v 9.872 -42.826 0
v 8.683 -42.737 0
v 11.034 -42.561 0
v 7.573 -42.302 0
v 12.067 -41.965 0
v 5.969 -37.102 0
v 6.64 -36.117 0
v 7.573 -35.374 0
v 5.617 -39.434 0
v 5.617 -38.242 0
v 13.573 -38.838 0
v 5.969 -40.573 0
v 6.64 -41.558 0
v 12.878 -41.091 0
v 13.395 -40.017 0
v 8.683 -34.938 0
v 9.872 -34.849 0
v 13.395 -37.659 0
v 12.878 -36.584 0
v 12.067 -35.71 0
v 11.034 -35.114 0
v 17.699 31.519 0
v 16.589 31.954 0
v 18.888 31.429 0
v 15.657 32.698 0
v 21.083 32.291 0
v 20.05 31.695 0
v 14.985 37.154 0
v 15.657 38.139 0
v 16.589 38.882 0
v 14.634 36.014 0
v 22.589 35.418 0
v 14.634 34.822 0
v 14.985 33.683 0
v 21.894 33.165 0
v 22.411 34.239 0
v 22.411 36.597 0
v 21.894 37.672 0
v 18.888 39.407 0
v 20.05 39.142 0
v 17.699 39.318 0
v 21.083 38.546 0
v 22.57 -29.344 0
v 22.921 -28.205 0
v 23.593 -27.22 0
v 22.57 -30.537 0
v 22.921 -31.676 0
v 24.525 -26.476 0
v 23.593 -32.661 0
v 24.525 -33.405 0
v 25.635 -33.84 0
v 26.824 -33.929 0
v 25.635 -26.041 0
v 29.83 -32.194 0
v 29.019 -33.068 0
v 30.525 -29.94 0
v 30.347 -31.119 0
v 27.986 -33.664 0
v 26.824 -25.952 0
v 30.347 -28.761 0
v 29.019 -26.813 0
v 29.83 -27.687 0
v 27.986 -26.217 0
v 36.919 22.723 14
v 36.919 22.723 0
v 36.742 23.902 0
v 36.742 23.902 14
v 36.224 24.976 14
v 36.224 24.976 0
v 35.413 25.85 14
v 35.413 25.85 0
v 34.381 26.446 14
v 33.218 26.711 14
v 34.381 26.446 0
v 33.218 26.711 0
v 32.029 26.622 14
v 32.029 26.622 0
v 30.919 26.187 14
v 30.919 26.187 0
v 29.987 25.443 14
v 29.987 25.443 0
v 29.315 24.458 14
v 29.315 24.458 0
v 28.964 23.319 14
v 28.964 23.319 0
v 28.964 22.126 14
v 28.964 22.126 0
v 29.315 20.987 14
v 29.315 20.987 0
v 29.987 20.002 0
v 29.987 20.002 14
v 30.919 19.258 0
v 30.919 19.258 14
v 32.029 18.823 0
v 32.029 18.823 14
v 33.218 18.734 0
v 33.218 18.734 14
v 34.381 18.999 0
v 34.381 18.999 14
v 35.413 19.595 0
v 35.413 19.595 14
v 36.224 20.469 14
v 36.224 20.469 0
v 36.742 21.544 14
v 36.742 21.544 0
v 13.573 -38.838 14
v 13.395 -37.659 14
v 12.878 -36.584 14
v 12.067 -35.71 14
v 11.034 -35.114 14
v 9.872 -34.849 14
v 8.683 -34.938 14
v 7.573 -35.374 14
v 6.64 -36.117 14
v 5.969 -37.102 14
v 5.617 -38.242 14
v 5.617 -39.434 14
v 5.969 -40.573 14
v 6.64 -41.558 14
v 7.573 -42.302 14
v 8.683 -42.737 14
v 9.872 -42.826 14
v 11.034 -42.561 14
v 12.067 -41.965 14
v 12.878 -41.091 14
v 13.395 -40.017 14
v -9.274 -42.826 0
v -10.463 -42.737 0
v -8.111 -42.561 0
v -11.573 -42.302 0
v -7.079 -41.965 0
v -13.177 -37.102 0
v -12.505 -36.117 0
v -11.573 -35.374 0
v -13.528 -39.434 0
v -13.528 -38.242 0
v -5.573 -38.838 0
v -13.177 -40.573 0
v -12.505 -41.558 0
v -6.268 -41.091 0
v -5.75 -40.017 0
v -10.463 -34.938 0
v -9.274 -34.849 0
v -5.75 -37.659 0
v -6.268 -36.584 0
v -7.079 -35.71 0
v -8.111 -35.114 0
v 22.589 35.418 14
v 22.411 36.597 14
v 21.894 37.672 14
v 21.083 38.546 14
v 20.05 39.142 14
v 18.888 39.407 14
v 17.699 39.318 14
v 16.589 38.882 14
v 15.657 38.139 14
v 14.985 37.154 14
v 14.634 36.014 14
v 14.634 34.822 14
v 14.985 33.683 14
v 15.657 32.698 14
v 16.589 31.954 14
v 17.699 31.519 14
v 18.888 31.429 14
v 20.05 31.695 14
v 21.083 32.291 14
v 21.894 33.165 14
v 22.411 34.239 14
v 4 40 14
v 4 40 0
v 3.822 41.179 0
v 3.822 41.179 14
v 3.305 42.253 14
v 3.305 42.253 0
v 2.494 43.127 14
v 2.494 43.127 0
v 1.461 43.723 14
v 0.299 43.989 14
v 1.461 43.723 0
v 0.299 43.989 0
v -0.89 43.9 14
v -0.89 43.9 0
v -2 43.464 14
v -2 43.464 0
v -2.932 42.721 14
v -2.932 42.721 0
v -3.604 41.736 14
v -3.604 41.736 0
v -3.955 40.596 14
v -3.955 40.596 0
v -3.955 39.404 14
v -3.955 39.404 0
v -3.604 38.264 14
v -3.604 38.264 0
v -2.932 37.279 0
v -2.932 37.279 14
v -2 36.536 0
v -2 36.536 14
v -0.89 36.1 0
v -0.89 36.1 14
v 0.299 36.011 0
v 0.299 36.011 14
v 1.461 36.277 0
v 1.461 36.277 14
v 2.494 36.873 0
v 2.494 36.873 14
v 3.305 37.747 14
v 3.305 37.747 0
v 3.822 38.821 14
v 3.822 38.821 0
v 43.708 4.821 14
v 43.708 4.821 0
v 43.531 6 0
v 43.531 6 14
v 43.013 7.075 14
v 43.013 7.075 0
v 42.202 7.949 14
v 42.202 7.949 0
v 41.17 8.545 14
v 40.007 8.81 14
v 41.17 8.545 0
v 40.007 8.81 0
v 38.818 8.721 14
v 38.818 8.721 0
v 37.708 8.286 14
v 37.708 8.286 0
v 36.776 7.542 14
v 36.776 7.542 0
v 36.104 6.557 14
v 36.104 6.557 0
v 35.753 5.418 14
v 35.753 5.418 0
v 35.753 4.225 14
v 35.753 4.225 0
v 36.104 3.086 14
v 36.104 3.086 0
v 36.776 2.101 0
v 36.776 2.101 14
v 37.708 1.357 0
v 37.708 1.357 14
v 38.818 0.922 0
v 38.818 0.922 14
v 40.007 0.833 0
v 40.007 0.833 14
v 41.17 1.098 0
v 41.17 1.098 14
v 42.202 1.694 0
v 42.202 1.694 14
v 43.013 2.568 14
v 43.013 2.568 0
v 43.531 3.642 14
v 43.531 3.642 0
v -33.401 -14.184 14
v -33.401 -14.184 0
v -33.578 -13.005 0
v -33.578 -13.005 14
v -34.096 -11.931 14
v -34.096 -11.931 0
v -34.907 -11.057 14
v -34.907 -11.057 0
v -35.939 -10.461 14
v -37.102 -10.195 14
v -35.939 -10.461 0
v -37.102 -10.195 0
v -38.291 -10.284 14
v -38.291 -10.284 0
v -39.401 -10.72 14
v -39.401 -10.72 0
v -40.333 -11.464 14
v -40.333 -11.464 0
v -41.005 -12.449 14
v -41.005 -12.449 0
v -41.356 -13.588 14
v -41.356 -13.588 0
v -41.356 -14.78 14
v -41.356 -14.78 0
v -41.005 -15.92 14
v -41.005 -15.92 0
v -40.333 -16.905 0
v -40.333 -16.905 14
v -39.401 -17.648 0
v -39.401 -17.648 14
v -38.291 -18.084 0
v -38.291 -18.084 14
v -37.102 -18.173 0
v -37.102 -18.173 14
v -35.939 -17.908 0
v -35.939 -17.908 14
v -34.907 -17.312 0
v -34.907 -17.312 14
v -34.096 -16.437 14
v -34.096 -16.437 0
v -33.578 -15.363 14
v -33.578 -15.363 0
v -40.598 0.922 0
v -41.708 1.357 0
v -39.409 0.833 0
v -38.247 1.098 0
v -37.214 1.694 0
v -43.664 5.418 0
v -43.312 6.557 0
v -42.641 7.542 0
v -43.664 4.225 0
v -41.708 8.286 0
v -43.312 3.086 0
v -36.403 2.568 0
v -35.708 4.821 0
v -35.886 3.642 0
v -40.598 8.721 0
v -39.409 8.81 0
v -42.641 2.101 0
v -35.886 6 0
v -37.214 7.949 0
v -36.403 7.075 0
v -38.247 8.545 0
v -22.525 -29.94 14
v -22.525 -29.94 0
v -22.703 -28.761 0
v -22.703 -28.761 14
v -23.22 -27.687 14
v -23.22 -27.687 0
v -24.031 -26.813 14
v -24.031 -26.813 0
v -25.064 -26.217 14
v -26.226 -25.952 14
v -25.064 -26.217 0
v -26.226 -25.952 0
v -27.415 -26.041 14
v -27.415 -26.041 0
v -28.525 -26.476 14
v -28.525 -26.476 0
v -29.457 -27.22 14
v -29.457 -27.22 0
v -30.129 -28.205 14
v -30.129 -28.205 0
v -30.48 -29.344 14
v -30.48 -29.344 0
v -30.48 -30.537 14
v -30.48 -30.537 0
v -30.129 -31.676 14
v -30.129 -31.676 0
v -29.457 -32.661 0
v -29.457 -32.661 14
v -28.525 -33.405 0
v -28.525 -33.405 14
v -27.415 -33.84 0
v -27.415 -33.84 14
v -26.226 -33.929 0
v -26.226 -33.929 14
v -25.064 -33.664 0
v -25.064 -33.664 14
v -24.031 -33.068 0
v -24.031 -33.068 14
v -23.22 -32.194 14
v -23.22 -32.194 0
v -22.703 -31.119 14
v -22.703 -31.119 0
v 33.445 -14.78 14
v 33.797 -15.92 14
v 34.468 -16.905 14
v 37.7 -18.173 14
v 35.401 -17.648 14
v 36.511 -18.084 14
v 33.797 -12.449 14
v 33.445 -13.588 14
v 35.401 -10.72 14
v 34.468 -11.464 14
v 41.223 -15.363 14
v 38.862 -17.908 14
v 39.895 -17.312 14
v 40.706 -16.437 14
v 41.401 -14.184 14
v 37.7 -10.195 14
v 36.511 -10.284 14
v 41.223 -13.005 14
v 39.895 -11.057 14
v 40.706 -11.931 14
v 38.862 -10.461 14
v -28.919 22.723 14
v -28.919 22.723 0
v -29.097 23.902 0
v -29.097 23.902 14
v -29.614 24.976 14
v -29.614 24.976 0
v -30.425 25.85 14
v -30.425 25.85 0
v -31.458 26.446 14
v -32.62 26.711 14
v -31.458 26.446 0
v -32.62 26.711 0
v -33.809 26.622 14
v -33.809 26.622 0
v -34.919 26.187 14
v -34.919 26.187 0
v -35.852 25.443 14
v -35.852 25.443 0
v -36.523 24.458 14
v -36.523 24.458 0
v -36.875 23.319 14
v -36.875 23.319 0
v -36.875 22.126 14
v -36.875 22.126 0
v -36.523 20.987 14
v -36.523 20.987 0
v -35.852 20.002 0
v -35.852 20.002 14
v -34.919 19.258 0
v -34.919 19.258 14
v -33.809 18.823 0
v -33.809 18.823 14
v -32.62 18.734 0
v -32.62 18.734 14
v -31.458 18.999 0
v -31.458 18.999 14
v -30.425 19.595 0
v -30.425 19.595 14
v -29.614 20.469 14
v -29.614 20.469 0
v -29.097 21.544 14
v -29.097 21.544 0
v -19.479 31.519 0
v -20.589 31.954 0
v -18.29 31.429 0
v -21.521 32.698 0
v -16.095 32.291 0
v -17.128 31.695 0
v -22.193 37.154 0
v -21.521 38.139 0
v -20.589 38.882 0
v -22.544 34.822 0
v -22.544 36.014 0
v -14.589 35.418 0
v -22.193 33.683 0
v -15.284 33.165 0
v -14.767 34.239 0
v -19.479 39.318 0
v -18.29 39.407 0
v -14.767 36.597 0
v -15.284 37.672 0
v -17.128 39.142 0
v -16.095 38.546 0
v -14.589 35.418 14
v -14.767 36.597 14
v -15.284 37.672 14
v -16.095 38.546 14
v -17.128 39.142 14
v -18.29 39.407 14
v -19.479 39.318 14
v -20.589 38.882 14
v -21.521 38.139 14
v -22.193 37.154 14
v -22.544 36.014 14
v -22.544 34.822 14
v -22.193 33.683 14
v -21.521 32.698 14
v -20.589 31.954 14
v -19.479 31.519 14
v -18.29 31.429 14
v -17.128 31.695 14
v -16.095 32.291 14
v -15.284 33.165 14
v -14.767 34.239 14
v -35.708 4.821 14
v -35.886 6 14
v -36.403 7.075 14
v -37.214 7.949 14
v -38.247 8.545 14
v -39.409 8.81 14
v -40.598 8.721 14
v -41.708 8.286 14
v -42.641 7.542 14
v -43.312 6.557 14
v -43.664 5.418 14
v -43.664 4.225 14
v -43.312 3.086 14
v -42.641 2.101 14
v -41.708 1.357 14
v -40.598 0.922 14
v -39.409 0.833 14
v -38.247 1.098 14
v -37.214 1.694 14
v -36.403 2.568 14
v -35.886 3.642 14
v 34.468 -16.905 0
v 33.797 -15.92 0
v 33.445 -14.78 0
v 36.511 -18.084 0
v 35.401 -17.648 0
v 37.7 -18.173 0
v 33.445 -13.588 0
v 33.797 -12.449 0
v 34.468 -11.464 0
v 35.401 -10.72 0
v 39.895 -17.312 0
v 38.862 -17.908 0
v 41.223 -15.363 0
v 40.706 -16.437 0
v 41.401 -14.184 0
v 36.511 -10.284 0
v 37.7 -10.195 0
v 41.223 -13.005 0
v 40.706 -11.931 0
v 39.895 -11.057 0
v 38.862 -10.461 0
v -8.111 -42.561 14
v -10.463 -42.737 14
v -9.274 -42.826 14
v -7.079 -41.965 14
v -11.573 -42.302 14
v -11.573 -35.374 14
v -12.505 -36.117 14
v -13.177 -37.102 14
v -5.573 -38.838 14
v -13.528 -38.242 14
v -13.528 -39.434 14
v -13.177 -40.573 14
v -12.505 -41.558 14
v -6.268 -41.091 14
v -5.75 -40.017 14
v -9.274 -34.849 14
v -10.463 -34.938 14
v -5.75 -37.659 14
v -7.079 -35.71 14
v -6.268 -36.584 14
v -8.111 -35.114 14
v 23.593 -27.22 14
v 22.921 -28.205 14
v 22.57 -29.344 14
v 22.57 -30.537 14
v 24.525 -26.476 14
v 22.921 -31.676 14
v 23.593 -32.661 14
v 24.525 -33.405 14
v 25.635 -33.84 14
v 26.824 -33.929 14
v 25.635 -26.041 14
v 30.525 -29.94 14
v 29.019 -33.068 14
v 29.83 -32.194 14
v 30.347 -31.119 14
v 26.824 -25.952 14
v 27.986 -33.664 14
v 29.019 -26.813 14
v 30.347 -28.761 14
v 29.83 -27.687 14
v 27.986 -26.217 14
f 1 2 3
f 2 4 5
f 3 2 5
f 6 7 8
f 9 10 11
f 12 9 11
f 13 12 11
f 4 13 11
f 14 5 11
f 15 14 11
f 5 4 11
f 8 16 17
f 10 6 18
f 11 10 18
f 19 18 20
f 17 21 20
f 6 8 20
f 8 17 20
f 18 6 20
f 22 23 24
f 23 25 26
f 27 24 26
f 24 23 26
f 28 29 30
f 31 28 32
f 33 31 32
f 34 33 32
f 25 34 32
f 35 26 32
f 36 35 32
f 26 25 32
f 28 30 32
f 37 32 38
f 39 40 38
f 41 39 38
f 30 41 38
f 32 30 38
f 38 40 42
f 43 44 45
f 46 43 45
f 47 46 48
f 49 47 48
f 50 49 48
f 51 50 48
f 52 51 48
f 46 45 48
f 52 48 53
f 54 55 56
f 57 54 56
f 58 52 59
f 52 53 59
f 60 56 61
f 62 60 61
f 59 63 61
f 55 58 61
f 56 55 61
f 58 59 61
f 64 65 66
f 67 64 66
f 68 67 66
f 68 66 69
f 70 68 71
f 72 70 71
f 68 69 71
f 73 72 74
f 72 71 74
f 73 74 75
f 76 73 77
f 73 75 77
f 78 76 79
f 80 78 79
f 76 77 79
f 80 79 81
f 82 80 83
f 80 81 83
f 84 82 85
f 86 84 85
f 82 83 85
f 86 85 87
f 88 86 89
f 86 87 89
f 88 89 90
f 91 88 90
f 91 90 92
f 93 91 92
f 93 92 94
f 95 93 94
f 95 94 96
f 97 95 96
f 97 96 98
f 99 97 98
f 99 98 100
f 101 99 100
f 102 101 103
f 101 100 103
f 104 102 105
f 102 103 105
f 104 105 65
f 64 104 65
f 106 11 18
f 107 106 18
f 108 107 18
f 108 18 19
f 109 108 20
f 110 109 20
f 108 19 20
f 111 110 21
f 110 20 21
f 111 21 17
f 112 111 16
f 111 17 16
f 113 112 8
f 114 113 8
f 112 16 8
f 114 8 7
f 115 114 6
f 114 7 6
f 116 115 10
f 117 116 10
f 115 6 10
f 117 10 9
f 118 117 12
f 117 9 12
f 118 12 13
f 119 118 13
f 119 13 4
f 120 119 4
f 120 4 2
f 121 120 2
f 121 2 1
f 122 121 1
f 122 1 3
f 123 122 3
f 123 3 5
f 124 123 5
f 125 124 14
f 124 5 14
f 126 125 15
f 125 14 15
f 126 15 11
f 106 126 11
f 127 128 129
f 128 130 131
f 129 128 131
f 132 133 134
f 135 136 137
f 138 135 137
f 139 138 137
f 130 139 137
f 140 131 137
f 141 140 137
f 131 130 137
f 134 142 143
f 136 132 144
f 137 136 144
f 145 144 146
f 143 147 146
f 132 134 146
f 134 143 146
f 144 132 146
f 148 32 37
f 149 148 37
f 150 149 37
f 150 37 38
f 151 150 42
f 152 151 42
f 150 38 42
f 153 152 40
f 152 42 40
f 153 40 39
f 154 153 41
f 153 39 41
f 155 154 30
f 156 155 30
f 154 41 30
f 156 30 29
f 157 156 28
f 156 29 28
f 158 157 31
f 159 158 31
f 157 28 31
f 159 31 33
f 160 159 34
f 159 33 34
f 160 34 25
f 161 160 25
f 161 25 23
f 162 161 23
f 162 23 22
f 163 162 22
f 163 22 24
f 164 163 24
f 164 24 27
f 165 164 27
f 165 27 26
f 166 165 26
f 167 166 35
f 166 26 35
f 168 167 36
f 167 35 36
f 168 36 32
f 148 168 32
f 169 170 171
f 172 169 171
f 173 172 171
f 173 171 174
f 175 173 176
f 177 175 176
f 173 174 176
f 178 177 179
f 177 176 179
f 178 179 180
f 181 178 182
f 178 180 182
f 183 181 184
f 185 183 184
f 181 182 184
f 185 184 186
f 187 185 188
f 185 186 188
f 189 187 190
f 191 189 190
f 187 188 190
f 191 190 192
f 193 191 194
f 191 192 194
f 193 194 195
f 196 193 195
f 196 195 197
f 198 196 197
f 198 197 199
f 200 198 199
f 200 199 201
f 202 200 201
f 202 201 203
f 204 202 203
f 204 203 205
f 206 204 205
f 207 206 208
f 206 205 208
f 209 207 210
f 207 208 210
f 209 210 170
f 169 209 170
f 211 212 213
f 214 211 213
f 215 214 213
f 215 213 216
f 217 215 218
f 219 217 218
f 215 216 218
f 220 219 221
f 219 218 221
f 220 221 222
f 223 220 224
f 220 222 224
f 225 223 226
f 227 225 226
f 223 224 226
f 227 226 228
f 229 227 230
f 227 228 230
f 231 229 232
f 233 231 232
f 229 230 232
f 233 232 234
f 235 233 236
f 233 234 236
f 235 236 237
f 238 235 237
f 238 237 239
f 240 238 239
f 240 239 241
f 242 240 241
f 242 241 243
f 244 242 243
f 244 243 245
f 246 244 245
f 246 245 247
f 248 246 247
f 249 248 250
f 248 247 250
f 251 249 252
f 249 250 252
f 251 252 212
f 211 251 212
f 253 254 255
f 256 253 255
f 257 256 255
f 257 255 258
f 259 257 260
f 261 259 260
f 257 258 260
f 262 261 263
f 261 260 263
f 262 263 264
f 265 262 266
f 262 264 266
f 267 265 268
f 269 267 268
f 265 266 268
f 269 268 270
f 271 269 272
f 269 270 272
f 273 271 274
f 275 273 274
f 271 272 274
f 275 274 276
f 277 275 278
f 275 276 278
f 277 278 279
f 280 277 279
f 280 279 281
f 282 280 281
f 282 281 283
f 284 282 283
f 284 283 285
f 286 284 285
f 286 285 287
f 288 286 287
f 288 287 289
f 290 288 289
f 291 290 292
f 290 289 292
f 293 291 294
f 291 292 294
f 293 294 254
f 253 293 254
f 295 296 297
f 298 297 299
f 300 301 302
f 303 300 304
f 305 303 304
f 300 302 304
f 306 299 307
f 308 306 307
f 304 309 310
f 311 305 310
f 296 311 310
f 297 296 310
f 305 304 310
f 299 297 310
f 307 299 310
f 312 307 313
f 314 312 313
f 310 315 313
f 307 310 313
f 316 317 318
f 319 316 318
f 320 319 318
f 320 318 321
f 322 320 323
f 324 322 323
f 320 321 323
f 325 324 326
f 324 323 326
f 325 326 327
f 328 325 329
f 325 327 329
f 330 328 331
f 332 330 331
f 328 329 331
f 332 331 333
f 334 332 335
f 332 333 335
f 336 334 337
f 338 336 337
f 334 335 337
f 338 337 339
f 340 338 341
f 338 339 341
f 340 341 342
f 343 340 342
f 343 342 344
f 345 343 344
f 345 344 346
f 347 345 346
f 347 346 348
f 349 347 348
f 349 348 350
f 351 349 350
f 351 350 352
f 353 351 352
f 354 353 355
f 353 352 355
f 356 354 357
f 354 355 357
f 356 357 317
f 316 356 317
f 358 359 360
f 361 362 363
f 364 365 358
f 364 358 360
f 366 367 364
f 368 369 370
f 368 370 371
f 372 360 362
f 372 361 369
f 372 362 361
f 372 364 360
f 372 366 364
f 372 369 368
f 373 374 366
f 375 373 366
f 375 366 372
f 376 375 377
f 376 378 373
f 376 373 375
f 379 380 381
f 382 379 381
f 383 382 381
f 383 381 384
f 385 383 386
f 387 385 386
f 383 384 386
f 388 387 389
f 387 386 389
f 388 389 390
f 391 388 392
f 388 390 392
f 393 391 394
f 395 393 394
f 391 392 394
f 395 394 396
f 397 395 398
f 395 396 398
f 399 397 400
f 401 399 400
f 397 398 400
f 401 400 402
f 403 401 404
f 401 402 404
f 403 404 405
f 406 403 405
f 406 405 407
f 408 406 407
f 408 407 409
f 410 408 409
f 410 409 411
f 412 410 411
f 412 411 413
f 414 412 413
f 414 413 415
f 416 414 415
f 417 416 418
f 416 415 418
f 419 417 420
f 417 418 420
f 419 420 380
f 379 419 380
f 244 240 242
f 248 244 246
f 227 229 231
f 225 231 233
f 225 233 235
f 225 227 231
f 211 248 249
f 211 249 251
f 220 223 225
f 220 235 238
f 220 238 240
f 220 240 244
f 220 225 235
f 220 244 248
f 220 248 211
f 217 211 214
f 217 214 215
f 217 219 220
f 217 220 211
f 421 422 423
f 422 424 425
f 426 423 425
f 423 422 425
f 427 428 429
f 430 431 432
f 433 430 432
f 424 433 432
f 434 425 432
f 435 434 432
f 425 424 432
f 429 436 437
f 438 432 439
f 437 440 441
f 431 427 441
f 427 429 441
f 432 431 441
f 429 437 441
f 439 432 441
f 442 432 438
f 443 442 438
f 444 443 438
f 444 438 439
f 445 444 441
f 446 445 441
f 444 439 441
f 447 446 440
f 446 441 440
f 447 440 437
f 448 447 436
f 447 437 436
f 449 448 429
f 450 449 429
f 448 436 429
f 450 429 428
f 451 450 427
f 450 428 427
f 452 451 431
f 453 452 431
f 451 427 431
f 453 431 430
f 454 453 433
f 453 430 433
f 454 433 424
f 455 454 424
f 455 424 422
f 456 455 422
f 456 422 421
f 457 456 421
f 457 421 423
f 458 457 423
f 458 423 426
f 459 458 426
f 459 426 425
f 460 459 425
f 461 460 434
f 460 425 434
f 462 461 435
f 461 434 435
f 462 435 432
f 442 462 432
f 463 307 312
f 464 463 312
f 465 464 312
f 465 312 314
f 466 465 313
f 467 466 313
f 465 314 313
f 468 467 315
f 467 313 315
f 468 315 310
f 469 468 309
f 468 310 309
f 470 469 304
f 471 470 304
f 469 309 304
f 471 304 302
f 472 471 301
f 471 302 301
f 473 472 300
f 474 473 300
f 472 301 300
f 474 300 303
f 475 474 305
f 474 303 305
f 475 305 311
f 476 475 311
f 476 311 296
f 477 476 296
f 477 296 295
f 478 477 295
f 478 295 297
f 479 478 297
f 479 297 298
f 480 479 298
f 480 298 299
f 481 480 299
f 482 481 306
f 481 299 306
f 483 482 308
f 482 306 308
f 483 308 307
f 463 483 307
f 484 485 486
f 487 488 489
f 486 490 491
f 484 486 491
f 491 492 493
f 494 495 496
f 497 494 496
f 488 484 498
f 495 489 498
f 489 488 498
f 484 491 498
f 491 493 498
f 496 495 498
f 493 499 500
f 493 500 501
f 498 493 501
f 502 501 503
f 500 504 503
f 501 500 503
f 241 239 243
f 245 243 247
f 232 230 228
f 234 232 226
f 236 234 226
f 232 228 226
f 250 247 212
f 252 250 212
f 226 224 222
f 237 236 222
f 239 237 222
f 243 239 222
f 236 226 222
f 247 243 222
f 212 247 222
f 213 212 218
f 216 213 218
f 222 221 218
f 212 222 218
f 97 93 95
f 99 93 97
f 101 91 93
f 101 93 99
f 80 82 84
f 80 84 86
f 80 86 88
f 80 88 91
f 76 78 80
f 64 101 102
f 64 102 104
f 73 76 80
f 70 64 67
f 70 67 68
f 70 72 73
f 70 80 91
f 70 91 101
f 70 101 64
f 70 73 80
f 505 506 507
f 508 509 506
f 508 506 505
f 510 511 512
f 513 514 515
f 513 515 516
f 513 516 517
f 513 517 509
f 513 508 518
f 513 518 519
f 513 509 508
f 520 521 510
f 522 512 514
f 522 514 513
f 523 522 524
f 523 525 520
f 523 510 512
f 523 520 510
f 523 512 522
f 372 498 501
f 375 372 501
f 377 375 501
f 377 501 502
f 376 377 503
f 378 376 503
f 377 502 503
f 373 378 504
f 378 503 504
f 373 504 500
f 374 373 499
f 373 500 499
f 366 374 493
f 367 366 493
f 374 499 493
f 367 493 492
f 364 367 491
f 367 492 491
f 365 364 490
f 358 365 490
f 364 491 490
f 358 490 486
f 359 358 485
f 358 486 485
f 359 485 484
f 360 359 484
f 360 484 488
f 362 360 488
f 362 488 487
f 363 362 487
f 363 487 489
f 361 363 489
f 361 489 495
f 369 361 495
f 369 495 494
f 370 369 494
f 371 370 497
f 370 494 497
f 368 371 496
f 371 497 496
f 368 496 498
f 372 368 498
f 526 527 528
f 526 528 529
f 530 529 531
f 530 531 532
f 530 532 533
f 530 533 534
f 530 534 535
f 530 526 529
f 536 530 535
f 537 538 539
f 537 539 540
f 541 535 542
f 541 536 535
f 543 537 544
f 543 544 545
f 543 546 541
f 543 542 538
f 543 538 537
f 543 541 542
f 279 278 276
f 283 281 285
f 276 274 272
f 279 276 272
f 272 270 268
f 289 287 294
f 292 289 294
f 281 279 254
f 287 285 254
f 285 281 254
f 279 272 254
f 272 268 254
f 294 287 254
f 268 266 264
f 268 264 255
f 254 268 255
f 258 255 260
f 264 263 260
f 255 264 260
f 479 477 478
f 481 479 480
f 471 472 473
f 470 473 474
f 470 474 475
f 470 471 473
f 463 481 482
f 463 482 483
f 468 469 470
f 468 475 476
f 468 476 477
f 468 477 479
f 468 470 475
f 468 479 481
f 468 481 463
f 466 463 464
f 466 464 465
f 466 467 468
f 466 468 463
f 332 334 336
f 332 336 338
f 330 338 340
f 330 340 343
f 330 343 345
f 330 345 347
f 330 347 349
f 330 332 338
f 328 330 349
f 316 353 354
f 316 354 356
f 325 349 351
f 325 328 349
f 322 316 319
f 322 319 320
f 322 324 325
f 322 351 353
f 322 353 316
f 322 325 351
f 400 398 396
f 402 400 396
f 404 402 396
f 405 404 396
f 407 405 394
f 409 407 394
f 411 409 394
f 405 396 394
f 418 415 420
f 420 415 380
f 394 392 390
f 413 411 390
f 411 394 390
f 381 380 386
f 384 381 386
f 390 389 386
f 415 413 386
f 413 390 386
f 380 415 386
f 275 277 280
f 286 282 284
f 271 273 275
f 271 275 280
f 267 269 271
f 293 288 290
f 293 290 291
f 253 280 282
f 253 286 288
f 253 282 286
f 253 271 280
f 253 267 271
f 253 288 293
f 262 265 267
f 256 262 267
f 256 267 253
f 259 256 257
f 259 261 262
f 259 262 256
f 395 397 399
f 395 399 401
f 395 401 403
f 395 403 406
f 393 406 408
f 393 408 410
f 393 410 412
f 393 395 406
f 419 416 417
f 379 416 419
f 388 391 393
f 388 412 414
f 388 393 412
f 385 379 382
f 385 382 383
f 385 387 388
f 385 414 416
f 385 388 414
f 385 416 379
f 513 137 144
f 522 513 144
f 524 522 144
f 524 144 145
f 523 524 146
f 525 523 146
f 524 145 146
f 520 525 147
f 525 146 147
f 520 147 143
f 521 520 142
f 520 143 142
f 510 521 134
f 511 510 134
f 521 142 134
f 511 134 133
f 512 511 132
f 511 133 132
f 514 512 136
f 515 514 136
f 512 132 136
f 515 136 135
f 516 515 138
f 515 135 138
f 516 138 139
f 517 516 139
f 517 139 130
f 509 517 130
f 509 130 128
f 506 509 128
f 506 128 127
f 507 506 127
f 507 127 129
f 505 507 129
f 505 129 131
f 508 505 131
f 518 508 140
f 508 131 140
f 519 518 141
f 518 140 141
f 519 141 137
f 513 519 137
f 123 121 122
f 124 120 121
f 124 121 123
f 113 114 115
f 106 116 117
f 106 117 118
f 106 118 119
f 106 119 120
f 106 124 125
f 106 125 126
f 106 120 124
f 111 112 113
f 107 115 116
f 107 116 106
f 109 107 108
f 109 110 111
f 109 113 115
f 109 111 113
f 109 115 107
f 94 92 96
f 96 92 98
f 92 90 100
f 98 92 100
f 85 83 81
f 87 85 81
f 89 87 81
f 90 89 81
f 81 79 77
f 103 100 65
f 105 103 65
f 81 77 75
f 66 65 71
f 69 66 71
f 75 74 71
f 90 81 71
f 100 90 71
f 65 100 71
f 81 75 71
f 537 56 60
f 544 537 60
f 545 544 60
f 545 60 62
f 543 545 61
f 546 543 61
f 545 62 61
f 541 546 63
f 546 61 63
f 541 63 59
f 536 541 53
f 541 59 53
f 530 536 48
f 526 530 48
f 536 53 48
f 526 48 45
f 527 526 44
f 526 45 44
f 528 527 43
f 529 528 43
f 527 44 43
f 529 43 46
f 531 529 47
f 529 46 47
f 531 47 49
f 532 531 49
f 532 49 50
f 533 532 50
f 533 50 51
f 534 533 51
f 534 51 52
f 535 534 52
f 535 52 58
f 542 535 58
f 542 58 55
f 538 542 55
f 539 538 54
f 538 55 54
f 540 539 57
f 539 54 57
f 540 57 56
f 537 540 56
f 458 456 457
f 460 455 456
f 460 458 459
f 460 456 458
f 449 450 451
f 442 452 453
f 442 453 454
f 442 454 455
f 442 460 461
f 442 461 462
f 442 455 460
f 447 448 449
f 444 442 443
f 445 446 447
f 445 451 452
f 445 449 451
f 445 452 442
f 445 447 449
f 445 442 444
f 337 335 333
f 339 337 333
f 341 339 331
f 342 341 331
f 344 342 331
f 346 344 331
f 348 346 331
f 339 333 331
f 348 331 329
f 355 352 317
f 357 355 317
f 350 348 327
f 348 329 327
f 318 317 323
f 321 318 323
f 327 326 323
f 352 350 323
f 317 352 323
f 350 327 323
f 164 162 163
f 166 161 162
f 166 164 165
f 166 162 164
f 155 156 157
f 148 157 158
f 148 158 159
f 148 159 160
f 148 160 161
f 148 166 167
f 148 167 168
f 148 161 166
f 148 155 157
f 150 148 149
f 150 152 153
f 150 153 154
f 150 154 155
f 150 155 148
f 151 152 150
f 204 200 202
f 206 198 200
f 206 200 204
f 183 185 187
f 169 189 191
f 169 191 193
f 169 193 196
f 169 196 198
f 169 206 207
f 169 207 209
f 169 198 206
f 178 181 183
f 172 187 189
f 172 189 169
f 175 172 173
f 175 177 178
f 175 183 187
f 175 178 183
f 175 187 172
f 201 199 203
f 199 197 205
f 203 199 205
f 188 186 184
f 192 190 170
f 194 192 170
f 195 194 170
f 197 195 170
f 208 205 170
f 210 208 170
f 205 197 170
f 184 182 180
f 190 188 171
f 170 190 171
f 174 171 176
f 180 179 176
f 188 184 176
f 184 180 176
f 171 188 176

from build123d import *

# Parameters (mm, degrees)
SKETCH1_R              = 4
BOSS_EXTRUDE1_DEPTH    = 14
BOSS_EXTRUDE1_2_DEPTH  = 14
BOSS_EXTRUDE1_3_DEPTH  = 14
BOSS_EXTRUDE1_4_DEPTH  = 14
BOSS_EXTRUDE1_5_DEPTH  = 14
BOSS_EXTRUDE1_6_DEPTH  = 14
BOSS_EXTRUDE1_7_DEPTH  = 14
BOSS_EXTRUDE1_8_DEPTH  = 14
BOSS_EXTRUDE1_9_DEPTH  = 14
BOSS_EXTRUDE1_10_DEPTH = 14
BOSS_EXTRUDE1_11_DEPTH = 14
BOSS_EXTRUDE1_12_DEPTH = 14
BOSS_EXTRUDE1_13_DEPTH = 14


with BuildPart() as part:
    # Sketch1 → Boss-Extrude1 (new body)
    with BuildSketch(Plane.XY):
        with Locations((0, 40)):
            Circle(SKETCH1_R)
    extrude(amount=BOSS_EXTRUDE1_DEPTH)


with BuildPart() as body_2:
    # Sketch1 → Boss-Extrude1 2 (new body)
    with BuildSketch(Plane.XY):
        with Locations((18.588926882, 35.418241026)):
            Circle(SKETCH1_R)
    extrude(amount=BOSS_EXTRUDE1_2_DEPTH)


with BuildPart() as body_3:
    # Sketch1 → Boss-Extrude1 3 (new body)
    with BuildSketch(Plane.XY):
        with Locations((32.919354636, 22.722589869)):
            Circle(SKETCH1_R)
    extrude(amount=BOSS_EXTRUDE1_3_DEPTH)


with BuildPart() as body_4:
    # Sketch1 → Boss-Extrude1 4 (new body)
    with BuildSketch(Plane.XY):
        with Locations((39.708354964, 4.82146721)):
            Circle(SKETCH1_R)
    extrude(amount=BOSS_EXTRUDE1_4_DEPTH)


with BuildPart() as body_5:
    # Sketch1 → Boss-Extrude1 5 (new body)
    with BuildSketch(Plane.XY):
        with Locations((37.400649707, -14.184195482)):
            Circle(SKETCH1_R)
    extrude(amount=BOSS_EXTRUDE1_5_DEPTH)


with BuildPart() as body_6:
    # Sketch1 → Boss-Extrude1 6 (new body)
    with BuildSketch(Plane.XY):
        with Locations((26.52490633, -29.940429927)):
            Circle(SKETCH1_R)
    extrude(amount=BOSS_EXTRUDE1_6_DEPTH)


with BuildPart() as body_7:
    # Sketch1 → Boss-Extrude1 7 (new body)
    with BuildSketch(Plane.XY):
        with Locations((9.572626572, -38.837672697)):
            Circle(SKETCH1_R)
    extrude(amount=BOSS_EXTRUDE1_7_DEPTH)


with BuildPart() as body_8:
    # Sketch1 → Boss-Extrude1 8 (new body)
    with BuildSketch(Plane.XY):
        with Locations((-9.572626572, -38.837672697)):
            Circle(SKETCH1_R)
    extrude(amount=BOSS_EXTRUDE1_8_DEPTH)


with BuildPart() as body_9:
    # Sketch1 → Boss-Extrude1 9 (new body)
    with BuildSketch(Plane.XY):
        with Locations((-26.52490633, -29.940429927)):
            Circle(SKETCH1_R)
    extrude(amount=BOSS_EXTRUDE1_9_DEPTH)


with BuildPart() as body_10:
    # Sketch1 → Boss-Extrude1 10 (new body)
    with BuildSketch(Plane.XY):
        with Locations((-37.400649707, -14.184195482)):
            Circle(SKETCH1_R)
    extrude(amount=BOSS_EXTRUDE1_10_DEPTH)


with BuildPart() as body_11:
    # Sketch1 → Boss-Extrude1 11 (new body)
    with BuildSketch(Plane.XY):
        with Locations((-39.708354964, 4.82146721)):
            Circle(SKETCH1_R)
    extrude(amount=BOSS_EXTRUDE1_11_DEPTH)


with BuildPart() as body_12:
    # Sketch1 → Boss-Extrude1 12 (new body)
    with BuildSketch(Plane.XY):
        with Locations((-32.919354636, 22.722589869)):
            Circle(SKETCH1_R)
    extrude(amount=BOSS_EXTRUDE1_12_DEPTH)


with BuildPart() as body_13:
    # Sketch1 → Boss-Extrude1 13 (new body)
    with BuildSketch(Plane.XY):
        with Locations((-18.588926882, 35.418241026)):
            Circle(SKETCH1_R)
    extrude(amount=BOSS_EXTRUDE1_13_DEPTH)


solid = Compound([part.part, body_2.part, body_3.part, body_4.part, body_5.part, body_6.part, body_7.part, body_8.part, body_9.part, body_10.part, body_11.part, body_12.part, body_13.part])
